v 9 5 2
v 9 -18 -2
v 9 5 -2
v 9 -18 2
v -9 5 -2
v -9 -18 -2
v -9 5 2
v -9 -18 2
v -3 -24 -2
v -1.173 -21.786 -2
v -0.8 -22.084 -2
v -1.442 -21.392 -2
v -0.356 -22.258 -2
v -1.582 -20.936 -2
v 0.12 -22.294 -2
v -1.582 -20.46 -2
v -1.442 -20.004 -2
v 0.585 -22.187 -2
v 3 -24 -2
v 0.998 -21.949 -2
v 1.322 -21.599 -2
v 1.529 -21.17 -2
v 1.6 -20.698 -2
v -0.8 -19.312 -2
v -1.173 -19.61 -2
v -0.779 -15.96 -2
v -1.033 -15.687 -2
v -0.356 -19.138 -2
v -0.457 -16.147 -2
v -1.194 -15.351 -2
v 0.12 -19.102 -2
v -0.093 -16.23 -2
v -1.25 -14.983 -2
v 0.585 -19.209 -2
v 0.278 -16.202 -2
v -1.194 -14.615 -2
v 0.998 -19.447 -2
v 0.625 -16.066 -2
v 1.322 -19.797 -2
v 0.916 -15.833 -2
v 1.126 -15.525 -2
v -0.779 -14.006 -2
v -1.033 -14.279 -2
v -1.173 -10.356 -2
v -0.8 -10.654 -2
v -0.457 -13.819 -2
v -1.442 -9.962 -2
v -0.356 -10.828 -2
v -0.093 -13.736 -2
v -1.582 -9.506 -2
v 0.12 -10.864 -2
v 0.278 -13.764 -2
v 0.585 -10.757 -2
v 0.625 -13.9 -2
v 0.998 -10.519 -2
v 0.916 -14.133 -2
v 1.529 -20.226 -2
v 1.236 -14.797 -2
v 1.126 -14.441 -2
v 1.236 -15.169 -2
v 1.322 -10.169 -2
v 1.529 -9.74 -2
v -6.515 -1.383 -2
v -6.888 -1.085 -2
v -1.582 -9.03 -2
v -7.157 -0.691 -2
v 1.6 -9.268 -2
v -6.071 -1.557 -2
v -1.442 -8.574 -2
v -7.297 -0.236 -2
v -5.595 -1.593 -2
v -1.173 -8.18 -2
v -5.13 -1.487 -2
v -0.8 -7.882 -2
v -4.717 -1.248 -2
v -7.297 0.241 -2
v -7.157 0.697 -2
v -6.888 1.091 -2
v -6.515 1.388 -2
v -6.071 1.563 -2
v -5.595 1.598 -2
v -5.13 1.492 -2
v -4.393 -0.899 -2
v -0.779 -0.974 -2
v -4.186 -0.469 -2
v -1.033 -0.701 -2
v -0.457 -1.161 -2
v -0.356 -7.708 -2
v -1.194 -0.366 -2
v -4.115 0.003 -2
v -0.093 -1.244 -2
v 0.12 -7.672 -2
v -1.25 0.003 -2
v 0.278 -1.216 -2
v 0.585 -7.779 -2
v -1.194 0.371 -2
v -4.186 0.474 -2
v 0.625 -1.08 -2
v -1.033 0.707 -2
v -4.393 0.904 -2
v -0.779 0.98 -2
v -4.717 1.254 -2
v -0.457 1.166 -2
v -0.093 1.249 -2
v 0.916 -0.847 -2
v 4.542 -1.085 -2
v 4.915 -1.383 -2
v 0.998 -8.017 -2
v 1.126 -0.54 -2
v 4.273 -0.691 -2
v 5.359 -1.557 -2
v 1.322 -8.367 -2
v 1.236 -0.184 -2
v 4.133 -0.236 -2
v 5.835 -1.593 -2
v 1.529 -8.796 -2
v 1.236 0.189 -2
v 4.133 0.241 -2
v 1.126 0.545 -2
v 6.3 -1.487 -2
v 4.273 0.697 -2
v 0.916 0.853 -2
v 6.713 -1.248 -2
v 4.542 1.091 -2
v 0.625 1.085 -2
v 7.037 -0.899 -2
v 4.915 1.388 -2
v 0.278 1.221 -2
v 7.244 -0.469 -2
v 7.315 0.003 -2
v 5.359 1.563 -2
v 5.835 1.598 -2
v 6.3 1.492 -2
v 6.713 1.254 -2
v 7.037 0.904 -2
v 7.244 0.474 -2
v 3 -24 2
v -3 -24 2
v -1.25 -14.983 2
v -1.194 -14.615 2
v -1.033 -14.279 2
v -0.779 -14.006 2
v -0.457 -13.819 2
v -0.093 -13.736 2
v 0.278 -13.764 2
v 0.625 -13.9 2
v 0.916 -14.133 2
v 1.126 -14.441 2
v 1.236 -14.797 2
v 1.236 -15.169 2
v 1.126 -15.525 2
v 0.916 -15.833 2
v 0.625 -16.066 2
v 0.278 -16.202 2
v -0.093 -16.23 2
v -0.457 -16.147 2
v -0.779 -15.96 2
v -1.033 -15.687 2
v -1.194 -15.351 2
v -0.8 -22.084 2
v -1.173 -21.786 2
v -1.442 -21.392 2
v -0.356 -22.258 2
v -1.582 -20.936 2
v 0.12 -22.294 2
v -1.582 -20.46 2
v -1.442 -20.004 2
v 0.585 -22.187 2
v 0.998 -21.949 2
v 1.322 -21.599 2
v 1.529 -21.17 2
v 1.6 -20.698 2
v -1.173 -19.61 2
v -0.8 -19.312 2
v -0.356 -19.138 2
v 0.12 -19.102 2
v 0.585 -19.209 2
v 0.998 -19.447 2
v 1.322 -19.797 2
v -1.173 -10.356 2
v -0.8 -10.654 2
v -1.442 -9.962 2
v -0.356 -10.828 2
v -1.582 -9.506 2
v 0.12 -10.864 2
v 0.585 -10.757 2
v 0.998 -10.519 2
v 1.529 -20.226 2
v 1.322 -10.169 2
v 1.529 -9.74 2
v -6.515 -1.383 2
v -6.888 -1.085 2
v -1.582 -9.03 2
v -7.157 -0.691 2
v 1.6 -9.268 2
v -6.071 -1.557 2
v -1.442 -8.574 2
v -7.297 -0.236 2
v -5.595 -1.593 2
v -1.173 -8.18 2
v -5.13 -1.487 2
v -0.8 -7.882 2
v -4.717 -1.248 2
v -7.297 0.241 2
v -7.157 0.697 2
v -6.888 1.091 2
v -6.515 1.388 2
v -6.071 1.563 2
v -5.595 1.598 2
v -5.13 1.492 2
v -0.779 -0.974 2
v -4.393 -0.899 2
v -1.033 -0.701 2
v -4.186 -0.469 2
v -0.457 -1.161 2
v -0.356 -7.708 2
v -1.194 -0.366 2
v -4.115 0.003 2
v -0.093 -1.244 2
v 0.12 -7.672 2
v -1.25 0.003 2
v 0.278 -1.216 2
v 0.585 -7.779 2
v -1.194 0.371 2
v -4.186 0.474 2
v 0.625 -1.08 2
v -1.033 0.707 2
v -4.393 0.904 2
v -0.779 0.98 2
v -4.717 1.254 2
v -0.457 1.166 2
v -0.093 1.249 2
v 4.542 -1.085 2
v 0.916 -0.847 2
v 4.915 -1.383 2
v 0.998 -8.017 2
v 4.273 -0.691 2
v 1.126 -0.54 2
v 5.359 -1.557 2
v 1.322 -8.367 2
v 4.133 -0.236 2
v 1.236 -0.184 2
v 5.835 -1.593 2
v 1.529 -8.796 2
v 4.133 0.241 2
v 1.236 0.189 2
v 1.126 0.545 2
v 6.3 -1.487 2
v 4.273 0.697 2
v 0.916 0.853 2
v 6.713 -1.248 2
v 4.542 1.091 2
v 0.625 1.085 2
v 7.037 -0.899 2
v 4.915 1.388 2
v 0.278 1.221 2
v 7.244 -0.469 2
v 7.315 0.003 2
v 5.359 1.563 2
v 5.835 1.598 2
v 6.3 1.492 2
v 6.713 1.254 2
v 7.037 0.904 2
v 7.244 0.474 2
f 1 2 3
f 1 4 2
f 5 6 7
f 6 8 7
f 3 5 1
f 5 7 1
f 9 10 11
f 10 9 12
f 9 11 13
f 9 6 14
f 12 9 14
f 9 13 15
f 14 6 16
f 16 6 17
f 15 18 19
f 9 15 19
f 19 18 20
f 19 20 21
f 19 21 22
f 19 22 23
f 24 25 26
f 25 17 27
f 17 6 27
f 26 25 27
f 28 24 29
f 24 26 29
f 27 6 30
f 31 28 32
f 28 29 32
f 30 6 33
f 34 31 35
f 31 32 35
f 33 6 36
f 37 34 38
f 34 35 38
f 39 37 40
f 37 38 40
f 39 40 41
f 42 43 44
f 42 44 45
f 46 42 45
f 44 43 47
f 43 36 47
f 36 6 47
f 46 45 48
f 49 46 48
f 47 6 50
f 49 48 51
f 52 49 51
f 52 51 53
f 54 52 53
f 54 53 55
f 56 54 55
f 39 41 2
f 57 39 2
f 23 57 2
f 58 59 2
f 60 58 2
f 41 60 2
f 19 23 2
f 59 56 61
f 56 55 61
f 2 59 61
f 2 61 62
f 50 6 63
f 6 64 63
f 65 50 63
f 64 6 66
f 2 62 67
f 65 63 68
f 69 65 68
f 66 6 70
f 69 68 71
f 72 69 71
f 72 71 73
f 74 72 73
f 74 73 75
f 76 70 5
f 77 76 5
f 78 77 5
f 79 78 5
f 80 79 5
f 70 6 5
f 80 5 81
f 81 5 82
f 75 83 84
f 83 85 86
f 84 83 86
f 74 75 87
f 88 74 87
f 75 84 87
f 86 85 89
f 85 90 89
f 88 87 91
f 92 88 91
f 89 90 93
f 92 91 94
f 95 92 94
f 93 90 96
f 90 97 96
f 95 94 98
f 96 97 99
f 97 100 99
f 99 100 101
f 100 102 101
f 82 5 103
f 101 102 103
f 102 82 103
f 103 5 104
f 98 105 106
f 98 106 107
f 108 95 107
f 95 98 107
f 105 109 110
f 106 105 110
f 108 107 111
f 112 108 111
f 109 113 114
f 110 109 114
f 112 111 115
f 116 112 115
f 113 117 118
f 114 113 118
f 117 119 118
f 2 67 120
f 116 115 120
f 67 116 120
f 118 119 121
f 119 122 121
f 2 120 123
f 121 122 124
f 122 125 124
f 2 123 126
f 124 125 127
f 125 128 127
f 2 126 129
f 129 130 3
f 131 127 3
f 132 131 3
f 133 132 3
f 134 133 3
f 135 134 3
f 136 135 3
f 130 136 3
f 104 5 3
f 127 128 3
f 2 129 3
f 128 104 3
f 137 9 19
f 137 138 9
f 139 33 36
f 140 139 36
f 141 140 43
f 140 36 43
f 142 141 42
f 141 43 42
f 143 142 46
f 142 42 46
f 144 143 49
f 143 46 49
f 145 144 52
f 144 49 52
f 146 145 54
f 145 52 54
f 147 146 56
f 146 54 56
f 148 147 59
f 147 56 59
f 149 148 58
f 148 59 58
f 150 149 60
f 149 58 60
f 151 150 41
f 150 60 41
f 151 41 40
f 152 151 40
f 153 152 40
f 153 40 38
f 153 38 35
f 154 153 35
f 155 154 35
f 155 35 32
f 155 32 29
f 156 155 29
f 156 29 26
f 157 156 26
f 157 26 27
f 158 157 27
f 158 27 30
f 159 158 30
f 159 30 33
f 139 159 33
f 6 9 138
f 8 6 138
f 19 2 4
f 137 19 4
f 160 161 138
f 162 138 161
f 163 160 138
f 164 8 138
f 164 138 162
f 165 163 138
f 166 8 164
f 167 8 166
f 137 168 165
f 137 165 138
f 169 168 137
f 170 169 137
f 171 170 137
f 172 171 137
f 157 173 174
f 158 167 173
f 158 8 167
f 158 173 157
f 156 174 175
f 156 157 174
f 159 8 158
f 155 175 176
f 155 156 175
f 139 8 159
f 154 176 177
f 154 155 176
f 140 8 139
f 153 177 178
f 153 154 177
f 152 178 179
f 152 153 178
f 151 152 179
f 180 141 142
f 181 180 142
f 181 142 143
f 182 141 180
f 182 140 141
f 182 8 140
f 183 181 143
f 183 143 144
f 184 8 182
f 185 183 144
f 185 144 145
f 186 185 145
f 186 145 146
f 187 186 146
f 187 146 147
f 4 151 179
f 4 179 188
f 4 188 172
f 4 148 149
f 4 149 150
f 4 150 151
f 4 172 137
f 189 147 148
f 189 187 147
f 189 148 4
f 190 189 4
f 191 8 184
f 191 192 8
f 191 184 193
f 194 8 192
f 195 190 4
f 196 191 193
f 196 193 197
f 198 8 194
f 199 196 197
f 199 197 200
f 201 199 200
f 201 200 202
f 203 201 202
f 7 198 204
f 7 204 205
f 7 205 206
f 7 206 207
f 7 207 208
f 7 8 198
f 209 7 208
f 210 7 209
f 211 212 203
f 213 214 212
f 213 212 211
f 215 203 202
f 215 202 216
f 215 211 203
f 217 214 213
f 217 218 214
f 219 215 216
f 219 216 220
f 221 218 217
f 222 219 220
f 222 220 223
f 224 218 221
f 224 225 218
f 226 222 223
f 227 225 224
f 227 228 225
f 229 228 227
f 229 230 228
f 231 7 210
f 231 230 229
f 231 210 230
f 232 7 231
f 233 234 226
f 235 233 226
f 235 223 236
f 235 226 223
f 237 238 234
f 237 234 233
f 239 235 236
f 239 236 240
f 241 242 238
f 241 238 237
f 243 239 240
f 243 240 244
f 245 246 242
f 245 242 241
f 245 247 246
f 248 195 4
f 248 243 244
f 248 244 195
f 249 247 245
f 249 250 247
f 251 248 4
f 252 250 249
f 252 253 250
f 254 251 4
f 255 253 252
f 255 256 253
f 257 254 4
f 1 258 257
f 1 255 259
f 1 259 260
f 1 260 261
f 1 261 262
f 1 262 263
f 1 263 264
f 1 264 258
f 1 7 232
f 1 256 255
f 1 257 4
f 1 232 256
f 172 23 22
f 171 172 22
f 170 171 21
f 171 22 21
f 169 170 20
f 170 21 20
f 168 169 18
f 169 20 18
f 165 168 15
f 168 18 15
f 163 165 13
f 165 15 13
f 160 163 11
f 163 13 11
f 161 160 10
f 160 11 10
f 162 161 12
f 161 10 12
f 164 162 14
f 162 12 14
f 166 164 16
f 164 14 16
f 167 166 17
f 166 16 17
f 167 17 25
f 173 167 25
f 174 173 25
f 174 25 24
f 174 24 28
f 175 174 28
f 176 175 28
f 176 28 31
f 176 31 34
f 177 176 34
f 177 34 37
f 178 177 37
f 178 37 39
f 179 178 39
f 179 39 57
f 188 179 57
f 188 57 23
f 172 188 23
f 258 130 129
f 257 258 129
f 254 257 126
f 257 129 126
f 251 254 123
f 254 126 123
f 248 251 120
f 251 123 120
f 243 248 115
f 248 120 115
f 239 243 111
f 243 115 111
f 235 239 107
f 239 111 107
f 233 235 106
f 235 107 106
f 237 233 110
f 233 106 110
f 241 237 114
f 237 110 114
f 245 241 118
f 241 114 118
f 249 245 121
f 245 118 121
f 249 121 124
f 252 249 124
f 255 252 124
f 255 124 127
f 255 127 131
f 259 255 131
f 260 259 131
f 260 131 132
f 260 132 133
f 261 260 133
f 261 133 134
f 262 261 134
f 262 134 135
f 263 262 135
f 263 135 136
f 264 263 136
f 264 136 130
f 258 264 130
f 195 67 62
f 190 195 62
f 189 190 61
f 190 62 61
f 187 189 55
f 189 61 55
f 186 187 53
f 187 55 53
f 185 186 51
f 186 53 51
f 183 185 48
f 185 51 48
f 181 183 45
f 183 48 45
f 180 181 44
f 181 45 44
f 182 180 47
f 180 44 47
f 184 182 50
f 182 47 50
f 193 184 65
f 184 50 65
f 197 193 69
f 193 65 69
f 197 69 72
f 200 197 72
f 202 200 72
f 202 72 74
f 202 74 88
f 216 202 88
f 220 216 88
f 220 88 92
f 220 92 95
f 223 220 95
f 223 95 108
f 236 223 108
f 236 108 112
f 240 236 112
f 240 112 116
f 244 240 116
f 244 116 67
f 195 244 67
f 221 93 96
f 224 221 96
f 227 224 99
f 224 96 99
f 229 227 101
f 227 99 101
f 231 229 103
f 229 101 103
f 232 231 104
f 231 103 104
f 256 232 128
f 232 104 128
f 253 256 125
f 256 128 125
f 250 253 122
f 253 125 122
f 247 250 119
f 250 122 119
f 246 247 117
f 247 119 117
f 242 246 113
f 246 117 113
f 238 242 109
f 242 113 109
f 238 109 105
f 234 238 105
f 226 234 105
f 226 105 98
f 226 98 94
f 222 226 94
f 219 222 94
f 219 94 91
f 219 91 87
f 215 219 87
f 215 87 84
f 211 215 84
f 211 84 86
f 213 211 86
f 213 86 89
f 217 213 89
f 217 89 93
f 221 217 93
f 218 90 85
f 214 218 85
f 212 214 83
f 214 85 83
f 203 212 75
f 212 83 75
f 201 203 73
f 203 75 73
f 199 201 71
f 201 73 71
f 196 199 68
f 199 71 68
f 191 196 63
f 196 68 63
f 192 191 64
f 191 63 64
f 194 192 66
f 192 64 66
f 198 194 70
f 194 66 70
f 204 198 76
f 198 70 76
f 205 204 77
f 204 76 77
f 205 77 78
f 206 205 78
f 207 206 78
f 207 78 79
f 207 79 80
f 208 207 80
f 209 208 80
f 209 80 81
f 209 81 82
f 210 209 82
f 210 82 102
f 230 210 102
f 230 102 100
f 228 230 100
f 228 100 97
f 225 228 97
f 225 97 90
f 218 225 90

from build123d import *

# Parameters (mm, degrees)
SKETCH1_W            = 18
SKETCH1_H            = 10
BOSS_EXTRUDE1_DEPTH  = 2
SKETCH2_W            = 18
SKETCH2_H            = 19
BOSS_EXTRUDE2_DEPTH  = 2
M3_CLEARANCE_HOLE1_D = 3.2
CHAMFER1_SIZE        = 6
M3_TAPPED_HOLE1_D    = 2.5


with BuildPart() as part:
    # Sketch1 → Boss-Extrude1 (new, symmetric)
    with BuildSketch(Plane.XY):
        Rectangle(SKETCH1_W, SKETCH1_H)
    extrude(amount=BOSS_EXTRUDE1_DEPTH, both=True)

    # Sketch2 → Boss-Extrude2 (add, symmetric)
    with BuildSketch(Plane.XY):
        with Locations((0, -14.5)):
            Rectangle(SKETCH2_W, SKETCH2_H)
    extrude(amount=BOSS_EXTRUDE2_DEPTH, both=True)

    # M3 Clearance Hole1 (through all)
    with Locations(Plane(origin=(0, 0, 2), x_dir=(-1, 0, 0), z_dir=(0, 0, 1))):
        with Locations((0, 9.268), (0, 20.698), (-5.715, -0.0028), (5.715, -0.0028)):
            Hole(M3_CLEARANCE_HOLE1_D / 2)

    # Chamfer1
    chamfer1_edges = [part.edges().sort_by_distance(p)[0] for p in [
        (-9, -24, 0),
        (9, -24, 0),
    ]]
    chamfer(chamfer1_edges, length=CHAMFER1_SIZE)

    # M3 Tapped Hole1 (through all)
    with Locations(Plane.XY.offset(2)):
        with Locations((0, -14.983), (0, 0.0028)):
            Hole(M3_TAPPED_HOLE1_D / 2)


solid = part.part
